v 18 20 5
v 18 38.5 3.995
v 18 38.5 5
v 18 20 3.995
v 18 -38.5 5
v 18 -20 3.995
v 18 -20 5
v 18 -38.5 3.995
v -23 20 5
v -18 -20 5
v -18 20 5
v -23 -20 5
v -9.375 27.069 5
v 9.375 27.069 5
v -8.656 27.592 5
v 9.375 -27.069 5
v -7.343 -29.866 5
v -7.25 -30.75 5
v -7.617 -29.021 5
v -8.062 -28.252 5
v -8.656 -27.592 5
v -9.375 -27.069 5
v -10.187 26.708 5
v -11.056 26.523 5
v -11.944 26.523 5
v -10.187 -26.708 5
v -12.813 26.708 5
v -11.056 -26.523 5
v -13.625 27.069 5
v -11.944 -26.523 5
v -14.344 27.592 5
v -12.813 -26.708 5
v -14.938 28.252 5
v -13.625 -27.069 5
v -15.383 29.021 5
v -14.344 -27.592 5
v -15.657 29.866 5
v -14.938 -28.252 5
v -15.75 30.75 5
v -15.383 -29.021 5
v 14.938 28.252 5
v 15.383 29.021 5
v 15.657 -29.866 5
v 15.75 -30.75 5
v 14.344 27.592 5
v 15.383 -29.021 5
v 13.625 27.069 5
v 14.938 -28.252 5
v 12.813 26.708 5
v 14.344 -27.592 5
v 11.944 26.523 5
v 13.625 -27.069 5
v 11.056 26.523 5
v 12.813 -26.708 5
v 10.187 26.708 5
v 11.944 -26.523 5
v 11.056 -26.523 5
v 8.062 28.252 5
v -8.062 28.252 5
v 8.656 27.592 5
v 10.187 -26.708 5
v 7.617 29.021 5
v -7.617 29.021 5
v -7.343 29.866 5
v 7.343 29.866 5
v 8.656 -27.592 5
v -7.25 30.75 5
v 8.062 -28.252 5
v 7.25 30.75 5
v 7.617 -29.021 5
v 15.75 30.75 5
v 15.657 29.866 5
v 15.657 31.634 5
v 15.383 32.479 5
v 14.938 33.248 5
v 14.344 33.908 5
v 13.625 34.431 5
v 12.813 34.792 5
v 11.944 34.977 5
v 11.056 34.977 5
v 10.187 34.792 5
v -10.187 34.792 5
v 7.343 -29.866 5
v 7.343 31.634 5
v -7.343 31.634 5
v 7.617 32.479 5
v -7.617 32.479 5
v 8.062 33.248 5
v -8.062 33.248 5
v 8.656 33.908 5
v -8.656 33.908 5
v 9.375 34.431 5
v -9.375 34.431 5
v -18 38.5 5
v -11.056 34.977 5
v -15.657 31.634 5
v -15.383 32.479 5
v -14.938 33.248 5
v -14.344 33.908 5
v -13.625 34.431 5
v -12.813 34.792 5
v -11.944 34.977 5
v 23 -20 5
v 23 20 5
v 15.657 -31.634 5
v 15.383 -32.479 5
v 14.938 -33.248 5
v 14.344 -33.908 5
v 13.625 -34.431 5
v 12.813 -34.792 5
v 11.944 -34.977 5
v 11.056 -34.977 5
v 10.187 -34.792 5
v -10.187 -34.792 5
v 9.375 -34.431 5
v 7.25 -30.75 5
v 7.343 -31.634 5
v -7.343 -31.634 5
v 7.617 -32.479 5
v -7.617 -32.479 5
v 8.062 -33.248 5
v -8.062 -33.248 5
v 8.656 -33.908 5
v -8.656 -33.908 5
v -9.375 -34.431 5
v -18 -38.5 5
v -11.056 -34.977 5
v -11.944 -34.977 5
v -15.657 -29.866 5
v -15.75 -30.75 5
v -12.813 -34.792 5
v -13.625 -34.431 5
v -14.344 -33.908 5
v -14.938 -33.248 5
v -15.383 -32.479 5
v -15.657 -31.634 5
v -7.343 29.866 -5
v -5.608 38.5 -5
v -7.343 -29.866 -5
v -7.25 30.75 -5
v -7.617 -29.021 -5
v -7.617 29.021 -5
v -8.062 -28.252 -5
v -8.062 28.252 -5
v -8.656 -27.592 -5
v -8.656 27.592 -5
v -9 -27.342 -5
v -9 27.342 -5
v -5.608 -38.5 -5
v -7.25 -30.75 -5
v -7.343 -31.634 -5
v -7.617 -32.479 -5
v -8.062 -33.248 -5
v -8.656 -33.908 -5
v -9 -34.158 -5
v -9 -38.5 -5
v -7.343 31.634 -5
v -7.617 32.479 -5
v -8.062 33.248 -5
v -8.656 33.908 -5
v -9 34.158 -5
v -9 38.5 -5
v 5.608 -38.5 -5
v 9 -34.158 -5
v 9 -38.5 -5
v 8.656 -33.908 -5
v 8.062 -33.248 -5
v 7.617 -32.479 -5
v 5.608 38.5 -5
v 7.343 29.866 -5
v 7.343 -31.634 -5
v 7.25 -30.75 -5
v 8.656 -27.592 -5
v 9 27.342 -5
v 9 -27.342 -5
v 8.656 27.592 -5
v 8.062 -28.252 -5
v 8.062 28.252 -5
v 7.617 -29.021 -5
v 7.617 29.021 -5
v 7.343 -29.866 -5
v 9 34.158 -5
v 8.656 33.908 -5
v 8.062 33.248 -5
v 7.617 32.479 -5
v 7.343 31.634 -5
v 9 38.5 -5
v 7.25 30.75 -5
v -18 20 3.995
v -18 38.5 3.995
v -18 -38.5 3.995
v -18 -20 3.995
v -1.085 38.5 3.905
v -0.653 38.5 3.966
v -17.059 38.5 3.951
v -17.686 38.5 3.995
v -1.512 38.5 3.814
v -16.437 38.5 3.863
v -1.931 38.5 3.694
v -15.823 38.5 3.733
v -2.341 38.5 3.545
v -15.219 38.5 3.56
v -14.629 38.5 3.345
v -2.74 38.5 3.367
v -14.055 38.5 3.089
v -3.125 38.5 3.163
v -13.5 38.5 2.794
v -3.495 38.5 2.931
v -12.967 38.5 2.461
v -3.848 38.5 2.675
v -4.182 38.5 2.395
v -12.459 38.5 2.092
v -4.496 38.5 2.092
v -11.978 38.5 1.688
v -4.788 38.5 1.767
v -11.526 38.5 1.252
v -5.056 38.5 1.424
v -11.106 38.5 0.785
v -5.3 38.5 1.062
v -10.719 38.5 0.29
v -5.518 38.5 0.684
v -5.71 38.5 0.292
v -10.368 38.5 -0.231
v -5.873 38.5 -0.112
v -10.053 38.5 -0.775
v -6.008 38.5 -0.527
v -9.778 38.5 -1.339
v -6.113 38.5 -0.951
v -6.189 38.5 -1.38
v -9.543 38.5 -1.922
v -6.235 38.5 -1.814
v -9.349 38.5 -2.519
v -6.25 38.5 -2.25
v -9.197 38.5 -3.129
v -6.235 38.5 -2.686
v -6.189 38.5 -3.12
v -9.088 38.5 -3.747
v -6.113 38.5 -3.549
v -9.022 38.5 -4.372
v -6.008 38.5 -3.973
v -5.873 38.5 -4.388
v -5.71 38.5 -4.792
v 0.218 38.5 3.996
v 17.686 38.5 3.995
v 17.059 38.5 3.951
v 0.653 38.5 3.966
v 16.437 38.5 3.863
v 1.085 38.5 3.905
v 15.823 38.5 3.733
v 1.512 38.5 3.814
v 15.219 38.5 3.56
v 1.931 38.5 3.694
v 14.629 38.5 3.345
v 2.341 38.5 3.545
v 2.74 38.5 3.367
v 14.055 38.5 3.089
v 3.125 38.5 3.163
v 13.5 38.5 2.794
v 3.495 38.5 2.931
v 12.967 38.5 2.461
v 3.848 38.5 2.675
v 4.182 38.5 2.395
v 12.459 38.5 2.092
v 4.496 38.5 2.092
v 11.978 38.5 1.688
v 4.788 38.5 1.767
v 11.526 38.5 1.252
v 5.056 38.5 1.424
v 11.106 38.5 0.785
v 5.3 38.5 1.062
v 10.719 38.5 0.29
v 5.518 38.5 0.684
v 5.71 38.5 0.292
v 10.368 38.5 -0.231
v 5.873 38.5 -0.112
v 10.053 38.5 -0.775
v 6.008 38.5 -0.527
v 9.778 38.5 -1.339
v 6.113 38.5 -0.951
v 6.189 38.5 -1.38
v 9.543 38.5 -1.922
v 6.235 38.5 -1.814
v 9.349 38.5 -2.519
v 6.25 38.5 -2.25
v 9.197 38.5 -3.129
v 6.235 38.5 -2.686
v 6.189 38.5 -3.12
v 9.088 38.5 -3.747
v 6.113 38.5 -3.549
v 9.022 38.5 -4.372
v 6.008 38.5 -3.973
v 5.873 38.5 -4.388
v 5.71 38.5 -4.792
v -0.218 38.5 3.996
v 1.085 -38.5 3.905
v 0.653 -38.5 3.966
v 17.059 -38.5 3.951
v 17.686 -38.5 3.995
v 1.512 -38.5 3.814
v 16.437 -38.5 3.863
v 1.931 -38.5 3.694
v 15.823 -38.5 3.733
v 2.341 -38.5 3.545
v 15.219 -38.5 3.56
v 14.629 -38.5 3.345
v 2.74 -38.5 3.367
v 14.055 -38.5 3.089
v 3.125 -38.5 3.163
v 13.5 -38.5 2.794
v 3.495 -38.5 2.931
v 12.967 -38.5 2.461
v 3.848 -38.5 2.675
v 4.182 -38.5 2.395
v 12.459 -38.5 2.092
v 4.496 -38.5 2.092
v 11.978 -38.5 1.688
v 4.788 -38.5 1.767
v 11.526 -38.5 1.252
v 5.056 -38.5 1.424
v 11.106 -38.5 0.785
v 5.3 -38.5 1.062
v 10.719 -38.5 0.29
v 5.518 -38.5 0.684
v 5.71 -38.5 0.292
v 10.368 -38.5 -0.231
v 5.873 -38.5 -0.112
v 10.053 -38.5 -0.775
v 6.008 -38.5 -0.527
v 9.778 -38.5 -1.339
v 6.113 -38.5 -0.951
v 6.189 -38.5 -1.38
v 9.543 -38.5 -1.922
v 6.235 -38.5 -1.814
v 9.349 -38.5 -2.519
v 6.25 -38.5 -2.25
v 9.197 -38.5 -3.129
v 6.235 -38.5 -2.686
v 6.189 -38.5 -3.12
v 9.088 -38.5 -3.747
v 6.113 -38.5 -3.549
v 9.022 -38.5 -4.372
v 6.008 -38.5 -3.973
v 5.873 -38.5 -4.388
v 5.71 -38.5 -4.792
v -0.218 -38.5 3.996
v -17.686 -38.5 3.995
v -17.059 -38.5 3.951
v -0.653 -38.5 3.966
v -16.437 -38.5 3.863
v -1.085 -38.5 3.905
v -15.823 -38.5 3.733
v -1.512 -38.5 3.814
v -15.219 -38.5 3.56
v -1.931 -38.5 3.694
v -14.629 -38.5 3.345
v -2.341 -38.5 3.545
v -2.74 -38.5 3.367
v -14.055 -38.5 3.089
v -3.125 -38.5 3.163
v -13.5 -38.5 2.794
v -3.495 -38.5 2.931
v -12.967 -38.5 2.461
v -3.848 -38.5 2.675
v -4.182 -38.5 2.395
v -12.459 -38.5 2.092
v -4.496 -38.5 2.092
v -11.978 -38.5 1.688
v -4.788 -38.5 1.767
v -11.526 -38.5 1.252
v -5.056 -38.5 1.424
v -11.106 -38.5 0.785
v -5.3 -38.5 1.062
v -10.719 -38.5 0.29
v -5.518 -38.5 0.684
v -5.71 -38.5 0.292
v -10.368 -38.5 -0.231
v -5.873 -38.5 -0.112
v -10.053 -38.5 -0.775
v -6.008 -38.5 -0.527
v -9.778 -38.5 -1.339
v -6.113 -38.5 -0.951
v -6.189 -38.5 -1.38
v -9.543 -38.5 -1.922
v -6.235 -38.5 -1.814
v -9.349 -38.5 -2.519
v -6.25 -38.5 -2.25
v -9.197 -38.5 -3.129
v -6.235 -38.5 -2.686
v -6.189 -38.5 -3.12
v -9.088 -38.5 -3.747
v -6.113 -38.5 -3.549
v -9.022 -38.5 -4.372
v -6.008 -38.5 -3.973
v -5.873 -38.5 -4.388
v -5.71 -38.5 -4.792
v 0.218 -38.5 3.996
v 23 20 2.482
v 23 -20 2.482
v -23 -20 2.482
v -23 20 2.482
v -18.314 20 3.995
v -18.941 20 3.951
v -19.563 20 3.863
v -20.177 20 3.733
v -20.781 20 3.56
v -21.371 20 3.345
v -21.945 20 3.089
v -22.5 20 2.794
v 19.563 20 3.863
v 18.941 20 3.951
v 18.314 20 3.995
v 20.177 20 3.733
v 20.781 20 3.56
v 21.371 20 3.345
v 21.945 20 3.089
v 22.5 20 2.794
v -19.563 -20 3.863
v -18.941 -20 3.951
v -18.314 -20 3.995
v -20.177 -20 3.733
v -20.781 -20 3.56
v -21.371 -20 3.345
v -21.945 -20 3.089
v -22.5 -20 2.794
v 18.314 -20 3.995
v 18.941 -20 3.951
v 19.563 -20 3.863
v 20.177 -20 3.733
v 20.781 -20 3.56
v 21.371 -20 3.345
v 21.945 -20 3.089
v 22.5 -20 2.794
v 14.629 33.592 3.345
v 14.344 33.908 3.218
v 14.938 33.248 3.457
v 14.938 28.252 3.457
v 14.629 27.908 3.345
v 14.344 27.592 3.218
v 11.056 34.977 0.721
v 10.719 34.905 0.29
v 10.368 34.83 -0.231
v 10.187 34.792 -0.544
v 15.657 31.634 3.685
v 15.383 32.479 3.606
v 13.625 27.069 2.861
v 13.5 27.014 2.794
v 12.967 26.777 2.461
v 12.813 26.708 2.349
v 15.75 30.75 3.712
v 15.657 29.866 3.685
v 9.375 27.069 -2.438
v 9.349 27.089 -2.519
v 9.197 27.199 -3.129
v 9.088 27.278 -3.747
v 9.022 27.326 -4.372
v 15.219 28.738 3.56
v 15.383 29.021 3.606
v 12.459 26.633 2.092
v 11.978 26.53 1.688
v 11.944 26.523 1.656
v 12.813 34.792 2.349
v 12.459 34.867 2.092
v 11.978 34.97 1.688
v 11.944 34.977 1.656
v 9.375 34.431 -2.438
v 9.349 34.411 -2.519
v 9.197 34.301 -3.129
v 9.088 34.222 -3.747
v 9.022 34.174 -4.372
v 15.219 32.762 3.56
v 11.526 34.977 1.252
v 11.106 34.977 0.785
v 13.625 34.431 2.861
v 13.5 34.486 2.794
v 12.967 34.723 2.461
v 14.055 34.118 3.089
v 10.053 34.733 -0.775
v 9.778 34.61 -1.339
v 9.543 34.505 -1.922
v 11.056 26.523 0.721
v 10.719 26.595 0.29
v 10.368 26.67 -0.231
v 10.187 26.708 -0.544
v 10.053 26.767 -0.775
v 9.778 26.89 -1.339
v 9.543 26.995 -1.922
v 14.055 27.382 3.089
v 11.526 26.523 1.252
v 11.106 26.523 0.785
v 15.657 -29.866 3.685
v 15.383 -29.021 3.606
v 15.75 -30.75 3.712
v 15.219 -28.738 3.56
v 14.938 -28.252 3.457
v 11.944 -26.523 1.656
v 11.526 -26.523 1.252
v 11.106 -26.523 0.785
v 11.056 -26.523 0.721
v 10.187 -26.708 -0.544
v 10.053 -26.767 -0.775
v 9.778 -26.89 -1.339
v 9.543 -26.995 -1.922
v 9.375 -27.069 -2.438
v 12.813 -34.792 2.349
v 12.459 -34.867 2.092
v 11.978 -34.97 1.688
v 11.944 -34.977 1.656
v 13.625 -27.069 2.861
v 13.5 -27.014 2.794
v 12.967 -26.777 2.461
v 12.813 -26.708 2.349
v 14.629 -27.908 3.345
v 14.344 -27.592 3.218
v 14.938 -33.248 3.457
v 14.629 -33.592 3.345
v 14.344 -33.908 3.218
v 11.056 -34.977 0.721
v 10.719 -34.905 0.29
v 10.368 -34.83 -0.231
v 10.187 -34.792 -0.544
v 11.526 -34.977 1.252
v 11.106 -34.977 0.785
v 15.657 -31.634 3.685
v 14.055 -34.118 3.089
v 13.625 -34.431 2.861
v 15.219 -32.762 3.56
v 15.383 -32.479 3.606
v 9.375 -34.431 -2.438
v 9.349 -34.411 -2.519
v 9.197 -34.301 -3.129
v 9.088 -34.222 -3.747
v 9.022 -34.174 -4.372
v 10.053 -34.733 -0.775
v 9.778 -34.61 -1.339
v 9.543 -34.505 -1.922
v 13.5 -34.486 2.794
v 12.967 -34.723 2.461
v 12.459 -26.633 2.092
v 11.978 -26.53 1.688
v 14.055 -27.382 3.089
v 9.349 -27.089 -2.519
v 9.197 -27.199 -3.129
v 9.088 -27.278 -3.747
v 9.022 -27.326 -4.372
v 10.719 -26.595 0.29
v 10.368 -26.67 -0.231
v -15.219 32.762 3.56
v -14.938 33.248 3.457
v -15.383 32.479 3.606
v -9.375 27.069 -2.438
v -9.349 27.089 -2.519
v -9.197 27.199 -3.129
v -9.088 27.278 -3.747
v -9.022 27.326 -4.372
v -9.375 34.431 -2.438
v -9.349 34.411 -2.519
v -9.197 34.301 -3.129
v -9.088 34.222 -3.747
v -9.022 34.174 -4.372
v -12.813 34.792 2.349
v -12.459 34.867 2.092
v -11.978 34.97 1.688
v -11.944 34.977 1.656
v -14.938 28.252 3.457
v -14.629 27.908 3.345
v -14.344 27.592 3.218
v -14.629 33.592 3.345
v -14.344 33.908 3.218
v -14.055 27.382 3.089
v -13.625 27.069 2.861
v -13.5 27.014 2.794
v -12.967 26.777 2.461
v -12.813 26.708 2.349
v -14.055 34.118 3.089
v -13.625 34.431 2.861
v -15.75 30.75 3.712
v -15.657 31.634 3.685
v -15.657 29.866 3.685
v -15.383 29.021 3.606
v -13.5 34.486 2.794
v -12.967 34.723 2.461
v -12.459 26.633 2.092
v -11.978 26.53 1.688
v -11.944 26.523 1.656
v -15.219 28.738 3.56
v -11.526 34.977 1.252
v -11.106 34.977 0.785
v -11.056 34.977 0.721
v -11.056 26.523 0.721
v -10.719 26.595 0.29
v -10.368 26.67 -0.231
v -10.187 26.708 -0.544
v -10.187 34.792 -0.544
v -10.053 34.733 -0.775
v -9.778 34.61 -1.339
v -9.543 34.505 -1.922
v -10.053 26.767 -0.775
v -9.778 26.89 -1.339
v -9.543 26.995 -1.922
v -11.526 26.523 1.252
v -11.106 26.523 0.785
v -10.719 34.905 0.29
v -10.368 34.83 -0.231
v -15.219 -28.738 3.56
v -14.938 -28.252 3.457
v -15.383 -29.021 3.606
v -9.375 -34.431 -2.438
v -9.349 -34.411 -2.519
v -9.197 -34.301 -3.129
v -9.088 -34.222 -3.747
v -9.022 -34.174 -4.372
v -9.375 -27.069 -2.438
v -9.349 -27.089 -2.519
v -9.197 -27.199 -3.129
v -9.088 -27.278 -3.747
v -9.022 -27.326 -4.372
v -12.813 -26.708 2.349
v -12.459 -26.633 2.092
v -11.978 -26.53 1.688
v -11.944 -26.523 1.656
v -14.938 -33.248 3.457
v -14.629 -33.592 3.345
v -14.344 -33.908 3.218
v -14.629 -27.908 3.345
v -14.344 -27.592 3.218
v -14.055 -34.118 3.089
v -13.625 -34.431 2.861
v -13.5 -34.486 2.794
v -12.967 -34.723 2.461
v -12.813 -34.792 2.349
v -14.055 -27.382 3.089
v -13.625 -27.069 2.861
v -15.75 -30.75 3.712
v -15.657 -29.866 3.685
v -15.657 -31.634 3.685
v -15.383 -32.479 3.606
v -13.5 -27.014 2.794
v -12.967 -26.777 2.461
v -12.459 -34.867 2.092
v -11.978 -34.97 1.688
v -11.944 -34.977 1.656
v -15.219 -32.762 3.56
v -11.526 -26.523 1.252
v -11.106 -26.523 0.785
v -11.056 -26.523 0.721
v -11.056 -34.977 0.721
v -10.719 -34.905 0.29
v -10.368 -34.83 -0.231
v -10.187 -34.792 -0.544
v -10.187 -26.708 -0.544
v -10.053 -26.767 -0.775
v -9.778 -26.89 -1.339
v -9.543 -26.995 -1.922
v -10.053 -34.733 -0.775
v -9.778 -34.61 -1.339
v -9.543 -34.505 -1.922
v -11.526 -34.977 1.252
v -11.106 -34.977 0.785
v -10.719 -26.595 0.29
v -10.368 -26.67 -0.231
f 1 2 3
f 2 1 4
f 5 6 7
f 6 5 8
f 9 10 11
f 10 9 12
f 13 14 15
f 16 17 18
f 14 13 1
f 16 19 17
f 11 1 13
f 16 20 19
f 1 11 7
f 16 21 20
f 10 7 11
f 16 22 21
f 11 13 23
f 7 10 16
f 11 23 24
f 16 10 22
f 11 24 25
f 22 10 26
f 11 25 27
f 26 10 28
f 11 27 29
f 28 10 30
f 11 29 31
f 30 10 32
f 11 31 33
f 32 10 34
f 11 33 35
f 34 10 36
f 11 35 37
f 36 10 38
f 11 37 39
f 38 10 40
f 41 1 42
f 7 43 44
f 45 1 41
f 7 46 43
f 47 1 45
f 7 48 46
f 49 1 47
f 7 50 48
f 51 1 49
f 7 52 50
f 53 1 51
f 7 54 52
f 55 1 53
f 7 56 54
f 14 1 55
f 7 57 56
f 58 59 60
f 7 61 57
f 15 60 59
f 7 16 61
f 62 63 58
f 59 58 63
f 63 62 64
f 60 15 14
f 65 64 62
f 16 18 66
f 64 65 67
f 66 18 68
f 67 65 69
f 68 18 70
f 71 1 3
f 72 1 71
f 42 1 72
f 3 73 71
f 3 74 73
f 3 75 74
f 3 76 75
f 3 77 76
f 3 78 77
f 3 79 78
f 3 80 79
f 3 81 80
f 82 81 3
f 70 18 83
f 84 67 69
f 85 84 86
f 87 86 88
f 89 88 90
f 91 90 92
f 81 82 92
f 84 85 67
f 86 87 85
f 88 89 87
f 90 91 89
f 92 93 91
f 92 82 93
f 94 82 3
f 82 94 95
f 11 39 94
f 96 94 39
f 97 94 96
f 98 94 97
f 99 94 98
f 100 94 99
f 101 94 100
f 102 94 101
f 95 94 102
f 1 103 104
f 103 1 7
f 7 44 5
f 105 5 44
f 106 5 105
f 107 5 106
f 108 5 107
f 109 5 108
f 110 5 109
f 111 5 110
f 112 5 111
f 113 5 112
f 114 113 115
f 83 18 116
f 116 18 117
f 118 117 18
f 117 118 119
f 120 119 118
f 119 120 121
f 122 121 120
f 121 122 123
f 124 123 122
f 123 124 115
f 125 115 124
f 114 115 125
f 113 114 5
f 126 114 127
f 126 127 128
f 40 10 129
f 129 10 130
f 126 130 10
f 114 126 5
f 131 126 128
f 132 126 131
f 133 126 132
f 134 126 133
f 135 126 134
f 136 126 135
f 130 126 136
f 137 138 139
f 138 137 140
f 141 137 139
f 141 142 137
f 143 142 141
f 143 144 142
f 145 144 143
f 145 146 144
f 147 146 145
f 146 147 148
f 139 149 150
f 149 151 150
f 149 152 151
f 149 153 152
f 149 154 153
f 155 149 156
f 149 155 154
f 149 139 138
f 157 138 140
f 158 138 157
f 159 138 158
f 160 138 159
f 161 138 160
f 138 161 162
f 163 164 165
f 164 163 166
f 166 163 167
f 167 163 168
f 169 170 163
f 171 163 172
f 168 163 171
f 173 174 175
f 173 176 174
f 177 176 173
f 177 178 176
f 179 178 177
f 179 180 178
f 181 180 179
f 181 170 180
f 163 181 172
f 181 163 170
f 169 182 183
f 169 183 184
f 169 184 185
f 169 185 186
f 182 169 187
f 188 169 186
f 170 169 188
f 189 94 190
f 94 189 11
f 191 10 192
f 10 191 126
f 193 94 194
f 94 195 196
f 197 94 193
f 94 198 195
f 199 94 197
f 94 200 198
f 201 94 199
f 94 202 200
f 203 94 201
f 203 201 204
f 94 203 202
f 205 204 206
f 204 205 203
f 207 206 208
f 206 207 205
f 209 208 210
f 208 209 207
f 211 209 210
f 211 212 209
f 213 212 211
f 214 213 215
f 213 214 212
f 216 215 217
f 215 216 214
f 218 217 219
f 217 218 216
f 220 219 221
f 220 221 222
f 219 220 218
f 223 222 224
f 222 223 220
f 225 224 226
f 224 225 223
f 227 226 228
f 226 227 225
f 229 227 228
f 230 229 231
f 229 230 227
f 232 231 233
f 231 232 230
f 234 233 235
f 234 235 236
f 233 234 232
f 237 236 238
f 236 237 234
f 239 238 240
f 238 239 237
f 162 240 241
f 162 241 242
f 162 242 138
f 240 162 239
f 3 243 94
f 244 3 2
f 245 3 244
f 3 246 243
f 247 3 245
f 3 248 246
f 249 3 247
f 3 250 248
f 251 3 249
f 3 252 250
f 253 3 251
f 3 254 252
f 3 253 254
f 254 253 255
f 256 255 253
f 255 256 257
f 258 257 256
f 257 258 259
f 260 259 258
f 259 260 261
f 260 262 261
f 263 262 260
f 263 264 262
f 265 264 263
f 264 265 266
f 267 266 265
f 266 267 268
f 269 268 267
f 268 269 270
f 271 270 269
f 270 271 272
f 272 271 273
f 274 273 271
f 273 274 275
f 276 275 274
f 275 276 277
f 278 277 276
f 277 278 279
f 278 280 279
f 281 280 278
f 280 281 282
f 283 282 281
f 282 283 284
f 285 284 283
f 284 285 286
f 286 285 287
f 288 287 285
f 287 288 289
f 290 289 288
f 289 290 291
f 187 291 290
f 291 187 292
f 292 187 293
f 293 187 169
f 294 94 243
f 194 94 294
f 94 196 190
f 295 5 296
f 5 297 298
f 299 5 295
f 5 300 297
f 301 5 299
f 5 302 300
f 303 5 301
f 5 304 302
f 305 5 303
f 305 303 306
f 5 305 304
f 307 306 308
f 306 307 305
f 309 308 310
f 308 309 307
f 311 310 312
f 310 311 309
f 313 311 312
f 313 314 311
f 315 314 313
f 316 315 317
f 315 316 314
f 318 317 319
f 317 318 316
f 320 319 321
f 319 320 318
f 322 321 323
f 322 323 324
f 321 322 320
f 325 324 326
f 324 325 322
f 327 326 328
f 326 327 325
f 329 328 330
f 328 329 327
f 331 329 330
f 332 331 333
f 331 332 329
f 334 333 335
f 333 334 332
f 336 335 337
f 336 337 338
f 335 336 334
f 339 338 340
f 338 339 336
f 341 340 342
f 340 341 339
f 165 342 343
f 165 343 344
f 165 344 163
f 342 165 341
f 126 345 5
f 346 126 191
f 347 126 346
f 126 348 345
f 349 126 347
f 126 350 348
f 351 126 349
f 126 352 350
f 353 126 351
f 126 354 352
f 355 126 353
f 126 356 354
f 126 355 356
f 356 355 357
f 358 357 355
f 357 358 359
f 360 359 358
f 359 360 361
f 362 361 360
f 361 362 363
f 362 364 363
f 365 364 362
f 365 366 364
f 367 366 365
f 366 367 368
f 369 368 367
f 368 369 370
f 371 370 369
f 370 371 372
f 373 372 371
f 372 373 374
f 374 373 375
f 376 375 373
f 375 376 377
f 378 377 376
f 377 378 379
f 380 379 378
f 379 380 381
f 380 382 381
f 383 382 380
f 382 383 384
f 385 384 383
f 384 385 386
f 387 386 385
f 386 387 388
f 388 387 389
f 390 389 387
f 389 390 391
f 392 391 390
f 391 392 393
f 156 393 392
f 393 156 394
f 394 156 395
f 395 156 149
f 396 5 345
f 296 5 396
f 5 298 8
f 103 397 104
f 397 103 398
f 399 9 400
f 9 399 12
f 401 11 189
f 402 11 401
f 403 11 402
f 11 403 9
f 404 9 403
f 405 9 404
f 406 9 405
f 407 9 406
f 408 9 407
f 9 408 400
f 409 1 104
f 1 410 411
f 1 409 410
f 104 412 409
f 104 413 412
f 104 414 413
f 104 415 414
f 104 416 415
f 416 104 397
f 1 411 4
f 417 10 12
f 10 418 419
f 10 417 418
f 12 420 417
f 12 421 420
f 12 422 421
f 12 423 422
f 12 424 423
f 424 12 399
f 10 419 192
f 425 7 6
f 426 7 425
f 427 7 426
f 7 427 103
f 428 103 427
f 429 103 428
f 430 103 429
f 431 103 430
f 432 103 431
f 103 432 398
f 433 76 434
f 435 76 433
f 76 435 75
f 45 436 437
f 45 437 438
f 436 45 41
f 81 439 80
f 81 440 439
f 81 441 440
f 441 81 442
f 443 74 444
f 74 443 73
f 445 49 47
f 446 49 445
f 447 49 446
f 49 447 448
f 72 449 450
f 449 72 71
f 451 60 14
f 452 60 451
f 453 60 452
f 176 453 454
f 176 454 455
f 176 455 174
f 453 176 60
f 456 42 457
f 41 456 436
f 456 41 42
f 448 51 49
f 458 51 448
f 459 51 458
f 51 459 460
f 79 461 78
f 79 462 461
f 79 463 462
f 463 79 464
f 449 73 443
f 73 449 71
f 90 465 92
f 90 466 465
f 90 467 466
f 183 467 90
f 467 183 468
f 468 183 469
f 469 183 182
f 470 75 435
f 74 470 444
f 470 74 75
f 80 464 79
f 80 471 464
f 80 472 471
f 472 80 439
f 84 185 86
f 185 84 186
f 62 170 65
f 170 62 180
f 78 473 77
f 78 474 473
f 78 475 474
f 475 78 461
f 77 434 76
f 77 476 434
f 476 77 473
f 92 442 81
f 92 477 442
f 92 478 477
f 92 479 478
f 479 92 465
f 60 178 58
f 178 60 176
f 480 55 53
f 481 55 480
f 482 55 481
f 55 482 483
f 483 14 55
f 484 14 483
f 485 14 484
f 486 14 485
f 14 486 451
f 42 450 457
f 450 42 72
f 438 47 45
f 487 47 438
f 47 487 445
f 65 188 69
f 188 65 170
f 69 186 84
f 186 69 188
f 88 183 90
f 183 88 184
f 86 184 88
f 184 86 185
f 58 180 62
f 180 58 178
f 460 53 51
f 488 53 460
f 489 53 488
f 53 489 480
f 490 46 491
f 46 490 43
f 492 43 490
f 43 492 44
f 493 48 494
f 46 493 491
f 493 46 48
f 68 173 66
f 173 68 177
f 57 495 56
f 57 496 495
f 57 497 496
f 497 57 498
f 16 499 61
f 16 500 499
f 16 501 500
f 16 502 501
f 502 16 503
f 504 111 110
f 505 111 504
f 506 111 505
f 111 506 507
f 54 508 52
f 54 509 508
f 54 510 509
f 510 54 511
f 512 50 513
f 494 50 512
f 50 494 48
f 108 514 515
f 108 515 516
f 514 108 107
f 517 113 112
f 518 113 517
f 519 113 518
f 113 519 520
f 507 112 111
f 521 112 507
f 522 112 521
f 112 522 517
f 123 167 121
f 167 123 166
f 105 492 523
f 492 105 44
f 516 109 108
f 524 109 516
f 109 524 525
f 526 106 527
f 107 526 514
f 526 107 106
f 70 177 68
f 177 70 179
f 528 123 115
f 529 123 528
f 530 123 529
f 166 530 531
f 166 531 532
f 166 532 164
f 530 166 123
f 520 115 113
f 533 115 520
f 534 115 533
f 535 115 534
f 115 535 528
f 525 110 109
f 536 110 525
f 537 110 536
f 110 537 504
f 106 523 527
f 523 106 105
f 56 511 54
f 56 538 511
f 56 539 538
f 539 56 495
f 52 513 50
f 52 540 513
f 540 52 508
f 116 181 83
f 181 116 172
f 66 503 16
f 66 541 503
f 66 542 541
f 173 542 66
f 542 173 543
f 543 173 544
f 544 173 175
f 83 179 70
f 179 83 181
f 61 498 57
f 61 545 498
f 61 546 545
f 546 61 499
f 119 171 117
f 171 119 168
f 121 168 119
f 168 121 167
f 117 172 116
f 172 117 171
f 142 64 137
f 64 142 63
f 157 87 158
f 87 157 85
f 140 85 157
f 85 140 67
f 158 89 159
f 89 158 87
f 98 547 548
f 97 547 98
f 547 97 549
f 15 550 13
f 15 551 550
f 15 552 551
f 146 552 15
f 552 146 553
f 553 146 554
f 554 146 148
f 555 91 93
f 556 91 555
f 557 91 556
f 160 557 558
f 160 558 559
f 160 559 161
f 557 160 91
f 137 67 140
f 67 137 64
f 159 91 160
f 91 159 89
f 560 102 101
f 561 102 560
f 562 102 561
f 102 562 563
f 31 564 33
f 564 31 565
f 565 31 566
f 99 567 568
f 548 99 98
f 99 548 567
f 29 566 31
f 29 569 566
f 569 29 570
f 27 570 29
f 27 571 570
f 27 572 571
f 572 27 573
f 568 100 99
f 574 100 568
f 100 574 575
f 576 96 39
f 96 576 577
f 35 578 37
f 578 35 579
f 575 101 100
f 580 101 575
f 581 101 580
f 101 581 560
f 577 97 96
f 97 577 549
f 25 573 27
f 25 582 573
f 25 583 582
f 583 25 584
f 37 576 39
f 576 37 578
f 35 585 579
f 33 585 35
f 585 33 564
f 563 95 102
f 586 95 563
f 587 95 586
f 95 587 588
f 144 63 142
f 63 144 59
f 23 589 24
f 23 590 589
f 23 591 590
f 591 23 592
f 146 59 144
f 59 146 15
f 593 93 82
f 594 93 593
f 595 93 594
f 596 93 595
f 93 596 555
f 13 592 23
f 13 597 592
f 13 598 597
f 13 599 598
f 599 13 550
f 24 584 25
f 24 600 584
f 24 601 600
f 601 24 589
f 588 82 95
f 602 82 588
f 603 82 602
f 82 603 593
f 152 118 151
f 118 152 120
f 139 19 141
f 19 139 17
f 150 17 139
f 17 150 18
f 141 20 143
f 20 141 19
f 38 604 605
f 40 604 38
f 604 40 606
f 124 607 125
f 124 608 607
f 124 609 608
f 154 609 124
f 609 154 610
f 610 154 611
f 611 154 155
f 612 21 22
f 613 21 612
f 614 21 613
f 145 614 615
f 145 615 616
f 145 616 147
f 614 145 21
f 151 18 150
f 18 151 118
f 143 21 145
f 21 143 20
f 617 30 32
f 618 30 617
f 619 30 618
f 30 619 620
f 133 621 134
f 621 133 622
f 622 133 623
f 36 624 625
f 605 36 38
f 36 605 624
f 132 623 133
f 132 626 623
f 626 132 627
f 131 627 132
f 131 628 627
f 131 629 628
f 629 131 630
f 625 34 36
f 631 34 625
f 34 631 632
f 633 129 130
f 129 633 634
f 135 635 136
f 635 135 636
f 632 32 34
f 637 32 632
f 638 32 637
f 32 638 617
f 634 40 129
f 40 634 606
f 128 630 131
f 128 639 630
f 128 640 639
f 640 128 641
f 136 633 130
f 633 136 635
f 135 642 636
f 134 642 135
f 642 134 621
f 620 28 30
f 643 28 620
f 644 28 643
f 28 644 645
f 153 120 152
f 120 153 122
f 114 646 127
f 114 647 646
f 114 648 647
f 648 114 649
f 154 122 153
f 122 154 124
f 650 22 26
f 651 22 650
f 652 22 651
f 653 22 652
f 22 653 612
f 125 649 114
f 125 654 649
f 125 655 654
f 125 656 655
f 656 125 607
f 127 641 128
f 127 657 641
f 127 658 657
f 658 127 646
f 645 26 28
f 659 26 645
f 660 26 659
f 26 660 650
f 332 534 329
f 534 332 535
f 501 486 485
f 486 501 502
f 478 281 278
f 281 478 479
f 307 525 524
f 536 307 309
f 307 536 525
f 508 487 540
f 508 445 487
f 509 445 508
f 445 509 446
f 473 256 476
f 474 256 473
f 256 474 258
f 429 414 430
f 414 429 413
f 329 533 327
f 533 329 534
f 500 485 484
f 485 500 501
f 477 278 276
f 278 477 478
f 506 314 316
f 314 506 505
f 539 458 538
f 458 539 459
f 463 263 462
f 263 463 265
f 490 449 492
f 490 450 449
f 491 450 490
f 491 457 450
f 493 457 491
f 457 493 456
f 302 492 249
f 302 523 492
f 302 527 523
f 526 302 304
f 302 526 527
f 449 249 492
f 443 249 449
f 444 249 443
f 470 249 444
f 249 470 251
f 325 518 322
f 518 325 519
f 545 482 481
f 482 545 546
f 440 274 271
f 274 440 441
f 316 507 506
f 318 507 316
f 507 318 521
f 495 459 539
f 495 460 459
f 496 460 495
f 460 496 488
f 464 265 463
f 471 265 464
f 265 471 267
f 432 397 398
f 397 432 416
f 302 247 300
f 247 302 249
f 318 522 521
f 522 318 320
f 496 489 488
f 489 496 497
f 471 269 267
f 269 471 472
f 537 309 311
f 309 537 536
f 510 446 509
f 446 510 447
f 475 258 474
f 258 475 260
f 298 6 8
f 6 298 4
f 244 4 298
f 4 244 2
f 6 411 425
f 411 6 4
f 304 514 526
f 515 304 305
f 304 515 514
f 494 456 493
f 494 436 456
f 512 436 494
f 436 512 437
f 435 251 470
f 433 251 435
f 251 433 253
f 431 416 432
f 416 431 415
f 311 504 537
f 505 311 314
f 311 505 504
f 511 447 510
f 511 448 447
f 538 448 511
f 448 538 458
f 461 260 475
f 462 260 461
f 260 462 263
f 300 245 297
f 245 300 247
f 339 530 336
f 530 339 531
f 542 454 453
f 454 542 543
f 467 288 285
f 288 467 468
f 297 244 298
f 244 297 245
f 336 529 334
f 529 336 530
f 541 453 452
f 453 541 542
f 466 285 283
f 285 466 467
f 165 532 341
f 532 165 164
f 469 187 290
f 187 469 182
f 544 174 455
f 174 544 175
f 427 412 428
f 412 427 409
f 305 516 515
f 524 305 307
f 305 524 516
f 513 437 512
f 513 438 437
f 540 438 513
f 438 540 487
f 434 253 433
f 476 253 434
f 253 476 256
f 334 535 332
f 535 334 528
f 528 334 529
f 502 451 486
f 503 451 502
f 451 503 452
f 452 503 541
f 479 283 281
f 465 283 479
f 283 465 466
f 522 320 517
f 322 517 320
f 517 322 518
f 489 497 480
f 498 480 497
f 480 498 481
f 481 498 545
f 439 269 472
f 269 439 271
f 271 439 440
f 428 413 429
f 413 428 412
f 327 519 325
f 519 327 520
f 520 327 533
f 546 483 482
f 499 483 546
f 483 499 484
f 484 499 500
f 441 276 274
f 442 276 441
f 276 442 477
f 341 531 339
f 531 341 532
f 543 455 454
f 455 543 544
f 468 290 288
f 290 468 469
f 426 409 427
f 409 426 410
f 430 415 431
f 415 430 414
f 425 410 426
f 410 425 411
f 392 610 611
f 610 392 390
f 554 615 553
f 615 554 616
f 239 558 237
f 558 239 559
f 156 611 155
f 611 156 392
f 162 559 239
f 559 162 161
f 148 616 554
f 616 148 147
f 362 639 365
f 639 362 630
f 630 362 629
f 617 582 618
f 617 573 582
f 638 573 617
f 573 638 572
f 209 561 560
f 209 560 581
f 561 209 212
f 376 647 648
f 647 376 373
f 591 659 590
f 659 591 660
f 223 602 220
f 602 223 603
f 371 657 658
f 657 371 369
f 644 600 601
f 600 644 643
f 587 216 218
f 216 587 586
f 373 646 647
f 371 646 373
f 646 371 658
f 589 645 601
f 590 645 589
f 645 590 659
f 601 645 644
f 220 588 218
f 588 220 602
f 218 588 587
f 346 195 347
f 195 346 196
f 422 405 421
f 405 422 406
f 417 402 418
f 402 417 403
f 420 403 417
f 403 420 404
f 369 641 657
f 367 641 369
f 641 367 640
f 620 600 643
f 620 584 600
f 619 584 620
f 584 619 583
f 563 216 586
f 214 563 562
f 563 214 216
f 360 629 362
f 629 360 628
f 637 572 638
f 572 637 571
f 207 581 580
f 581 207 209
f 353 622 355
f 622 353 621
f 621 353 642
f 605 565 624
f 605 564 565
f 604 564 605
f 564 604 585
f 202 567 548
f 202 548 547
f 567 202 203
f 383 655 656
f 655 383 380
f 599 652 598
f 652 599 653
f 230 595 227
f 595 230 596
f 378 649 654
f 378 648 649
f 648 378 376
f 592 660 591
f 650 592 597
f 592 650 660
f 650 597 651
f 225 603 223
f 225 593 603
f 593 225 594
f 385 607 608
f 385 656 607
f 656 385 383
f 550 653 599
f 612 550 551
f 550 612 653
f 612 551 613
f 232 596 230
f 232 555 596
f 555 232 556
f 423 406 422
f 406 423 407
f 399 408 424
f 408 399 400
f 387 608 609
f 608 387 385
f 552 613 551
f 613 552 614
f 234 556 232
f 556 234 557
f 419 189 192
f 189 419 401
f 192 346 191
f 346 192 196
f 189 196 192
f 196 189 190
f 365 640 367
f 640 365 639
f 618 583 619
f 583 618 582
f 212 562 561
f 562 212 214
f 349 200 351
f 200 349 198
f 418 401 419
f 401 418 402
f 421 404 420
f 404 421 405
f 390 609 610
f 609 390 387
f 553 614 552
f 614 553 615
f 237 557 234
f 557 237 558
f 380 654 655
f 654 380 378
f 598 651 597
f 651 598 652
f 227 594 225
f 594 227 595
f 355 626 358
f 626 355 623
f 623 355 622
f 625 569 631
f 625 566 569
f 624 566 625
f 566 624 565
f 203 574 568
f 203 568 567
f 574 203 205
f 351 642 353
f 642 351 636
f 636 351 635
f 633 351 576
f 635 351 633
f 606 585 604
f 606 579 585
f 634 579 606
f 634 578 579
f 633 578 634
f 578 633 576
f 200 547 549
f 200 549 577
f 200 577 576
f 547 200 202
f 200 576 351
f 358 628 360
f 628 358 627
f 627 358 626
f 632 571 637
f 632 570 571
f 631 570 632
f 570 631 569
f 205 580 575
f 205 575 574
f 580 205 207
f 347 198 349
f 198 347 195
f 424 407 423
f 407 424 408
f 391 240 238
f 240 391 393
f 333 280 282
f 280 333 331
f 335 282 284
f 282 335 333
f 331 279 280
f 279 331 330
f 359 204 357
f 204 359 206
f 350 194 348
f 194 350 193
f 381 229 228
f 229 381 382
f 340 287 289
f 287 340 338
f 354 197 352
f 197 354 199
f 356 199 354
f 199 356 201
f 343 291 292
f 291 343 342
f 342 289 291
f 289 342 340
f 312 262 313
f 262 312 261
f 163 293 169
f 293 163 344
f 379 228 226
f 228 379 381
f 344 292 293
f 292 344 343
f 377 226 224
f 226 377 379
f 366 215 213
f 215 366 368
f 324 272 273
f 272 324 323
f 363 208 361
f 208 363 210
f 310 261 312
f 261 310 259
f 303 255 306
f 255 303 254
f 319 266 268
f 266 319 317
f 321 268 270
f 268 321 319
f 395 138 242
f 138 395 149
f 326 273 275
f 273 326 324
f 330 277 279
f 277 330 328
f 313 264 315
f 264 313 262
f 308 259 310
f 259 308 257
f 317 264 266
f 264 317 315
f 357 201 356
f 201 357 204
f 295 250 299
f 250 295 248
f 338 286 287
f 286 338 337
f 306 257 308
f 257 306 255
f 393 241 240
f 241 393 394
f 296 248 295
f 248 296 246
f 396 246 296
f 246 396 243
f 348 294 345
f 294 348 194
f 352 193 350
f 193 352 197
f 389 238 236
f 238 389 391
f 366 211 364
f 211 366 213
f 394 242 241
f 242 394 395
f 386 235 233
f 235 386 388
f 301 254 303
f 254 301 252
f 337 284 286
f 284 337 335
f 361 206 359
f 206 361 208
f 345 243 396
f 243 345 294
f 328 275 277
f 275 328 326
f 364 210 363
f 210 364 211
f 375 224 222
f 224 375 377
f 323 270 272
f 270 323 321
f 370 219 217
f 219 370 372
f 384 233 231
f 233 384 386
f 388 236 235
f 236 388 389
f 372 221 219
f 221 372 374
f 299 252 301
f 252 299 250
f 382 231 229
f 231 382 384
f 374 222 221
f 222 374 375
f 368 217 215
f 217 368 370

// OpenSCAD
w = 36;
h = 77;
t = 10;

module base () {
    translate([0,0,0])
        cube([w,h,t],true);
        cube([w+10,40,t],true);
}

module slot (x,y) {
    d = 20;
    hh = 61.5;
    ww = 23;
    l = 1.2 * t;
    
    translate([x*(ww/2), y*(hh/2), -l/2])
      cylinder(h=l,r=8.5/2, $fn=30);
}

module slots () {
    slot(+1,+1);
    slot(+1,-1);
    slot(-1,+1);
    slot(-1,-1);
}

module recess () {
    translate([0,0,8])
        cube ([w,h,10],true);
}

module shaft () {
    d = 12.5;
    l = 1.2*h;
    translate([0,l/2,4-d/2])
        rotate([90,0,0])
            cylinder(h=l,r=d/2,$fn=90);
}

module shape (x) {
    d = w/2;
    l = 1.2*h;
    translate([x*w/2,l/2,-t/2])
        rotate([90,0,0])
            cylinder(h=l,r=d/2,$fn=90);
}

module shapes () {
    shape(+1);
    shape(-1);
}
        

difference () {
    base();
    slots();
    //recess();
    shaft();
    shapes();
}
